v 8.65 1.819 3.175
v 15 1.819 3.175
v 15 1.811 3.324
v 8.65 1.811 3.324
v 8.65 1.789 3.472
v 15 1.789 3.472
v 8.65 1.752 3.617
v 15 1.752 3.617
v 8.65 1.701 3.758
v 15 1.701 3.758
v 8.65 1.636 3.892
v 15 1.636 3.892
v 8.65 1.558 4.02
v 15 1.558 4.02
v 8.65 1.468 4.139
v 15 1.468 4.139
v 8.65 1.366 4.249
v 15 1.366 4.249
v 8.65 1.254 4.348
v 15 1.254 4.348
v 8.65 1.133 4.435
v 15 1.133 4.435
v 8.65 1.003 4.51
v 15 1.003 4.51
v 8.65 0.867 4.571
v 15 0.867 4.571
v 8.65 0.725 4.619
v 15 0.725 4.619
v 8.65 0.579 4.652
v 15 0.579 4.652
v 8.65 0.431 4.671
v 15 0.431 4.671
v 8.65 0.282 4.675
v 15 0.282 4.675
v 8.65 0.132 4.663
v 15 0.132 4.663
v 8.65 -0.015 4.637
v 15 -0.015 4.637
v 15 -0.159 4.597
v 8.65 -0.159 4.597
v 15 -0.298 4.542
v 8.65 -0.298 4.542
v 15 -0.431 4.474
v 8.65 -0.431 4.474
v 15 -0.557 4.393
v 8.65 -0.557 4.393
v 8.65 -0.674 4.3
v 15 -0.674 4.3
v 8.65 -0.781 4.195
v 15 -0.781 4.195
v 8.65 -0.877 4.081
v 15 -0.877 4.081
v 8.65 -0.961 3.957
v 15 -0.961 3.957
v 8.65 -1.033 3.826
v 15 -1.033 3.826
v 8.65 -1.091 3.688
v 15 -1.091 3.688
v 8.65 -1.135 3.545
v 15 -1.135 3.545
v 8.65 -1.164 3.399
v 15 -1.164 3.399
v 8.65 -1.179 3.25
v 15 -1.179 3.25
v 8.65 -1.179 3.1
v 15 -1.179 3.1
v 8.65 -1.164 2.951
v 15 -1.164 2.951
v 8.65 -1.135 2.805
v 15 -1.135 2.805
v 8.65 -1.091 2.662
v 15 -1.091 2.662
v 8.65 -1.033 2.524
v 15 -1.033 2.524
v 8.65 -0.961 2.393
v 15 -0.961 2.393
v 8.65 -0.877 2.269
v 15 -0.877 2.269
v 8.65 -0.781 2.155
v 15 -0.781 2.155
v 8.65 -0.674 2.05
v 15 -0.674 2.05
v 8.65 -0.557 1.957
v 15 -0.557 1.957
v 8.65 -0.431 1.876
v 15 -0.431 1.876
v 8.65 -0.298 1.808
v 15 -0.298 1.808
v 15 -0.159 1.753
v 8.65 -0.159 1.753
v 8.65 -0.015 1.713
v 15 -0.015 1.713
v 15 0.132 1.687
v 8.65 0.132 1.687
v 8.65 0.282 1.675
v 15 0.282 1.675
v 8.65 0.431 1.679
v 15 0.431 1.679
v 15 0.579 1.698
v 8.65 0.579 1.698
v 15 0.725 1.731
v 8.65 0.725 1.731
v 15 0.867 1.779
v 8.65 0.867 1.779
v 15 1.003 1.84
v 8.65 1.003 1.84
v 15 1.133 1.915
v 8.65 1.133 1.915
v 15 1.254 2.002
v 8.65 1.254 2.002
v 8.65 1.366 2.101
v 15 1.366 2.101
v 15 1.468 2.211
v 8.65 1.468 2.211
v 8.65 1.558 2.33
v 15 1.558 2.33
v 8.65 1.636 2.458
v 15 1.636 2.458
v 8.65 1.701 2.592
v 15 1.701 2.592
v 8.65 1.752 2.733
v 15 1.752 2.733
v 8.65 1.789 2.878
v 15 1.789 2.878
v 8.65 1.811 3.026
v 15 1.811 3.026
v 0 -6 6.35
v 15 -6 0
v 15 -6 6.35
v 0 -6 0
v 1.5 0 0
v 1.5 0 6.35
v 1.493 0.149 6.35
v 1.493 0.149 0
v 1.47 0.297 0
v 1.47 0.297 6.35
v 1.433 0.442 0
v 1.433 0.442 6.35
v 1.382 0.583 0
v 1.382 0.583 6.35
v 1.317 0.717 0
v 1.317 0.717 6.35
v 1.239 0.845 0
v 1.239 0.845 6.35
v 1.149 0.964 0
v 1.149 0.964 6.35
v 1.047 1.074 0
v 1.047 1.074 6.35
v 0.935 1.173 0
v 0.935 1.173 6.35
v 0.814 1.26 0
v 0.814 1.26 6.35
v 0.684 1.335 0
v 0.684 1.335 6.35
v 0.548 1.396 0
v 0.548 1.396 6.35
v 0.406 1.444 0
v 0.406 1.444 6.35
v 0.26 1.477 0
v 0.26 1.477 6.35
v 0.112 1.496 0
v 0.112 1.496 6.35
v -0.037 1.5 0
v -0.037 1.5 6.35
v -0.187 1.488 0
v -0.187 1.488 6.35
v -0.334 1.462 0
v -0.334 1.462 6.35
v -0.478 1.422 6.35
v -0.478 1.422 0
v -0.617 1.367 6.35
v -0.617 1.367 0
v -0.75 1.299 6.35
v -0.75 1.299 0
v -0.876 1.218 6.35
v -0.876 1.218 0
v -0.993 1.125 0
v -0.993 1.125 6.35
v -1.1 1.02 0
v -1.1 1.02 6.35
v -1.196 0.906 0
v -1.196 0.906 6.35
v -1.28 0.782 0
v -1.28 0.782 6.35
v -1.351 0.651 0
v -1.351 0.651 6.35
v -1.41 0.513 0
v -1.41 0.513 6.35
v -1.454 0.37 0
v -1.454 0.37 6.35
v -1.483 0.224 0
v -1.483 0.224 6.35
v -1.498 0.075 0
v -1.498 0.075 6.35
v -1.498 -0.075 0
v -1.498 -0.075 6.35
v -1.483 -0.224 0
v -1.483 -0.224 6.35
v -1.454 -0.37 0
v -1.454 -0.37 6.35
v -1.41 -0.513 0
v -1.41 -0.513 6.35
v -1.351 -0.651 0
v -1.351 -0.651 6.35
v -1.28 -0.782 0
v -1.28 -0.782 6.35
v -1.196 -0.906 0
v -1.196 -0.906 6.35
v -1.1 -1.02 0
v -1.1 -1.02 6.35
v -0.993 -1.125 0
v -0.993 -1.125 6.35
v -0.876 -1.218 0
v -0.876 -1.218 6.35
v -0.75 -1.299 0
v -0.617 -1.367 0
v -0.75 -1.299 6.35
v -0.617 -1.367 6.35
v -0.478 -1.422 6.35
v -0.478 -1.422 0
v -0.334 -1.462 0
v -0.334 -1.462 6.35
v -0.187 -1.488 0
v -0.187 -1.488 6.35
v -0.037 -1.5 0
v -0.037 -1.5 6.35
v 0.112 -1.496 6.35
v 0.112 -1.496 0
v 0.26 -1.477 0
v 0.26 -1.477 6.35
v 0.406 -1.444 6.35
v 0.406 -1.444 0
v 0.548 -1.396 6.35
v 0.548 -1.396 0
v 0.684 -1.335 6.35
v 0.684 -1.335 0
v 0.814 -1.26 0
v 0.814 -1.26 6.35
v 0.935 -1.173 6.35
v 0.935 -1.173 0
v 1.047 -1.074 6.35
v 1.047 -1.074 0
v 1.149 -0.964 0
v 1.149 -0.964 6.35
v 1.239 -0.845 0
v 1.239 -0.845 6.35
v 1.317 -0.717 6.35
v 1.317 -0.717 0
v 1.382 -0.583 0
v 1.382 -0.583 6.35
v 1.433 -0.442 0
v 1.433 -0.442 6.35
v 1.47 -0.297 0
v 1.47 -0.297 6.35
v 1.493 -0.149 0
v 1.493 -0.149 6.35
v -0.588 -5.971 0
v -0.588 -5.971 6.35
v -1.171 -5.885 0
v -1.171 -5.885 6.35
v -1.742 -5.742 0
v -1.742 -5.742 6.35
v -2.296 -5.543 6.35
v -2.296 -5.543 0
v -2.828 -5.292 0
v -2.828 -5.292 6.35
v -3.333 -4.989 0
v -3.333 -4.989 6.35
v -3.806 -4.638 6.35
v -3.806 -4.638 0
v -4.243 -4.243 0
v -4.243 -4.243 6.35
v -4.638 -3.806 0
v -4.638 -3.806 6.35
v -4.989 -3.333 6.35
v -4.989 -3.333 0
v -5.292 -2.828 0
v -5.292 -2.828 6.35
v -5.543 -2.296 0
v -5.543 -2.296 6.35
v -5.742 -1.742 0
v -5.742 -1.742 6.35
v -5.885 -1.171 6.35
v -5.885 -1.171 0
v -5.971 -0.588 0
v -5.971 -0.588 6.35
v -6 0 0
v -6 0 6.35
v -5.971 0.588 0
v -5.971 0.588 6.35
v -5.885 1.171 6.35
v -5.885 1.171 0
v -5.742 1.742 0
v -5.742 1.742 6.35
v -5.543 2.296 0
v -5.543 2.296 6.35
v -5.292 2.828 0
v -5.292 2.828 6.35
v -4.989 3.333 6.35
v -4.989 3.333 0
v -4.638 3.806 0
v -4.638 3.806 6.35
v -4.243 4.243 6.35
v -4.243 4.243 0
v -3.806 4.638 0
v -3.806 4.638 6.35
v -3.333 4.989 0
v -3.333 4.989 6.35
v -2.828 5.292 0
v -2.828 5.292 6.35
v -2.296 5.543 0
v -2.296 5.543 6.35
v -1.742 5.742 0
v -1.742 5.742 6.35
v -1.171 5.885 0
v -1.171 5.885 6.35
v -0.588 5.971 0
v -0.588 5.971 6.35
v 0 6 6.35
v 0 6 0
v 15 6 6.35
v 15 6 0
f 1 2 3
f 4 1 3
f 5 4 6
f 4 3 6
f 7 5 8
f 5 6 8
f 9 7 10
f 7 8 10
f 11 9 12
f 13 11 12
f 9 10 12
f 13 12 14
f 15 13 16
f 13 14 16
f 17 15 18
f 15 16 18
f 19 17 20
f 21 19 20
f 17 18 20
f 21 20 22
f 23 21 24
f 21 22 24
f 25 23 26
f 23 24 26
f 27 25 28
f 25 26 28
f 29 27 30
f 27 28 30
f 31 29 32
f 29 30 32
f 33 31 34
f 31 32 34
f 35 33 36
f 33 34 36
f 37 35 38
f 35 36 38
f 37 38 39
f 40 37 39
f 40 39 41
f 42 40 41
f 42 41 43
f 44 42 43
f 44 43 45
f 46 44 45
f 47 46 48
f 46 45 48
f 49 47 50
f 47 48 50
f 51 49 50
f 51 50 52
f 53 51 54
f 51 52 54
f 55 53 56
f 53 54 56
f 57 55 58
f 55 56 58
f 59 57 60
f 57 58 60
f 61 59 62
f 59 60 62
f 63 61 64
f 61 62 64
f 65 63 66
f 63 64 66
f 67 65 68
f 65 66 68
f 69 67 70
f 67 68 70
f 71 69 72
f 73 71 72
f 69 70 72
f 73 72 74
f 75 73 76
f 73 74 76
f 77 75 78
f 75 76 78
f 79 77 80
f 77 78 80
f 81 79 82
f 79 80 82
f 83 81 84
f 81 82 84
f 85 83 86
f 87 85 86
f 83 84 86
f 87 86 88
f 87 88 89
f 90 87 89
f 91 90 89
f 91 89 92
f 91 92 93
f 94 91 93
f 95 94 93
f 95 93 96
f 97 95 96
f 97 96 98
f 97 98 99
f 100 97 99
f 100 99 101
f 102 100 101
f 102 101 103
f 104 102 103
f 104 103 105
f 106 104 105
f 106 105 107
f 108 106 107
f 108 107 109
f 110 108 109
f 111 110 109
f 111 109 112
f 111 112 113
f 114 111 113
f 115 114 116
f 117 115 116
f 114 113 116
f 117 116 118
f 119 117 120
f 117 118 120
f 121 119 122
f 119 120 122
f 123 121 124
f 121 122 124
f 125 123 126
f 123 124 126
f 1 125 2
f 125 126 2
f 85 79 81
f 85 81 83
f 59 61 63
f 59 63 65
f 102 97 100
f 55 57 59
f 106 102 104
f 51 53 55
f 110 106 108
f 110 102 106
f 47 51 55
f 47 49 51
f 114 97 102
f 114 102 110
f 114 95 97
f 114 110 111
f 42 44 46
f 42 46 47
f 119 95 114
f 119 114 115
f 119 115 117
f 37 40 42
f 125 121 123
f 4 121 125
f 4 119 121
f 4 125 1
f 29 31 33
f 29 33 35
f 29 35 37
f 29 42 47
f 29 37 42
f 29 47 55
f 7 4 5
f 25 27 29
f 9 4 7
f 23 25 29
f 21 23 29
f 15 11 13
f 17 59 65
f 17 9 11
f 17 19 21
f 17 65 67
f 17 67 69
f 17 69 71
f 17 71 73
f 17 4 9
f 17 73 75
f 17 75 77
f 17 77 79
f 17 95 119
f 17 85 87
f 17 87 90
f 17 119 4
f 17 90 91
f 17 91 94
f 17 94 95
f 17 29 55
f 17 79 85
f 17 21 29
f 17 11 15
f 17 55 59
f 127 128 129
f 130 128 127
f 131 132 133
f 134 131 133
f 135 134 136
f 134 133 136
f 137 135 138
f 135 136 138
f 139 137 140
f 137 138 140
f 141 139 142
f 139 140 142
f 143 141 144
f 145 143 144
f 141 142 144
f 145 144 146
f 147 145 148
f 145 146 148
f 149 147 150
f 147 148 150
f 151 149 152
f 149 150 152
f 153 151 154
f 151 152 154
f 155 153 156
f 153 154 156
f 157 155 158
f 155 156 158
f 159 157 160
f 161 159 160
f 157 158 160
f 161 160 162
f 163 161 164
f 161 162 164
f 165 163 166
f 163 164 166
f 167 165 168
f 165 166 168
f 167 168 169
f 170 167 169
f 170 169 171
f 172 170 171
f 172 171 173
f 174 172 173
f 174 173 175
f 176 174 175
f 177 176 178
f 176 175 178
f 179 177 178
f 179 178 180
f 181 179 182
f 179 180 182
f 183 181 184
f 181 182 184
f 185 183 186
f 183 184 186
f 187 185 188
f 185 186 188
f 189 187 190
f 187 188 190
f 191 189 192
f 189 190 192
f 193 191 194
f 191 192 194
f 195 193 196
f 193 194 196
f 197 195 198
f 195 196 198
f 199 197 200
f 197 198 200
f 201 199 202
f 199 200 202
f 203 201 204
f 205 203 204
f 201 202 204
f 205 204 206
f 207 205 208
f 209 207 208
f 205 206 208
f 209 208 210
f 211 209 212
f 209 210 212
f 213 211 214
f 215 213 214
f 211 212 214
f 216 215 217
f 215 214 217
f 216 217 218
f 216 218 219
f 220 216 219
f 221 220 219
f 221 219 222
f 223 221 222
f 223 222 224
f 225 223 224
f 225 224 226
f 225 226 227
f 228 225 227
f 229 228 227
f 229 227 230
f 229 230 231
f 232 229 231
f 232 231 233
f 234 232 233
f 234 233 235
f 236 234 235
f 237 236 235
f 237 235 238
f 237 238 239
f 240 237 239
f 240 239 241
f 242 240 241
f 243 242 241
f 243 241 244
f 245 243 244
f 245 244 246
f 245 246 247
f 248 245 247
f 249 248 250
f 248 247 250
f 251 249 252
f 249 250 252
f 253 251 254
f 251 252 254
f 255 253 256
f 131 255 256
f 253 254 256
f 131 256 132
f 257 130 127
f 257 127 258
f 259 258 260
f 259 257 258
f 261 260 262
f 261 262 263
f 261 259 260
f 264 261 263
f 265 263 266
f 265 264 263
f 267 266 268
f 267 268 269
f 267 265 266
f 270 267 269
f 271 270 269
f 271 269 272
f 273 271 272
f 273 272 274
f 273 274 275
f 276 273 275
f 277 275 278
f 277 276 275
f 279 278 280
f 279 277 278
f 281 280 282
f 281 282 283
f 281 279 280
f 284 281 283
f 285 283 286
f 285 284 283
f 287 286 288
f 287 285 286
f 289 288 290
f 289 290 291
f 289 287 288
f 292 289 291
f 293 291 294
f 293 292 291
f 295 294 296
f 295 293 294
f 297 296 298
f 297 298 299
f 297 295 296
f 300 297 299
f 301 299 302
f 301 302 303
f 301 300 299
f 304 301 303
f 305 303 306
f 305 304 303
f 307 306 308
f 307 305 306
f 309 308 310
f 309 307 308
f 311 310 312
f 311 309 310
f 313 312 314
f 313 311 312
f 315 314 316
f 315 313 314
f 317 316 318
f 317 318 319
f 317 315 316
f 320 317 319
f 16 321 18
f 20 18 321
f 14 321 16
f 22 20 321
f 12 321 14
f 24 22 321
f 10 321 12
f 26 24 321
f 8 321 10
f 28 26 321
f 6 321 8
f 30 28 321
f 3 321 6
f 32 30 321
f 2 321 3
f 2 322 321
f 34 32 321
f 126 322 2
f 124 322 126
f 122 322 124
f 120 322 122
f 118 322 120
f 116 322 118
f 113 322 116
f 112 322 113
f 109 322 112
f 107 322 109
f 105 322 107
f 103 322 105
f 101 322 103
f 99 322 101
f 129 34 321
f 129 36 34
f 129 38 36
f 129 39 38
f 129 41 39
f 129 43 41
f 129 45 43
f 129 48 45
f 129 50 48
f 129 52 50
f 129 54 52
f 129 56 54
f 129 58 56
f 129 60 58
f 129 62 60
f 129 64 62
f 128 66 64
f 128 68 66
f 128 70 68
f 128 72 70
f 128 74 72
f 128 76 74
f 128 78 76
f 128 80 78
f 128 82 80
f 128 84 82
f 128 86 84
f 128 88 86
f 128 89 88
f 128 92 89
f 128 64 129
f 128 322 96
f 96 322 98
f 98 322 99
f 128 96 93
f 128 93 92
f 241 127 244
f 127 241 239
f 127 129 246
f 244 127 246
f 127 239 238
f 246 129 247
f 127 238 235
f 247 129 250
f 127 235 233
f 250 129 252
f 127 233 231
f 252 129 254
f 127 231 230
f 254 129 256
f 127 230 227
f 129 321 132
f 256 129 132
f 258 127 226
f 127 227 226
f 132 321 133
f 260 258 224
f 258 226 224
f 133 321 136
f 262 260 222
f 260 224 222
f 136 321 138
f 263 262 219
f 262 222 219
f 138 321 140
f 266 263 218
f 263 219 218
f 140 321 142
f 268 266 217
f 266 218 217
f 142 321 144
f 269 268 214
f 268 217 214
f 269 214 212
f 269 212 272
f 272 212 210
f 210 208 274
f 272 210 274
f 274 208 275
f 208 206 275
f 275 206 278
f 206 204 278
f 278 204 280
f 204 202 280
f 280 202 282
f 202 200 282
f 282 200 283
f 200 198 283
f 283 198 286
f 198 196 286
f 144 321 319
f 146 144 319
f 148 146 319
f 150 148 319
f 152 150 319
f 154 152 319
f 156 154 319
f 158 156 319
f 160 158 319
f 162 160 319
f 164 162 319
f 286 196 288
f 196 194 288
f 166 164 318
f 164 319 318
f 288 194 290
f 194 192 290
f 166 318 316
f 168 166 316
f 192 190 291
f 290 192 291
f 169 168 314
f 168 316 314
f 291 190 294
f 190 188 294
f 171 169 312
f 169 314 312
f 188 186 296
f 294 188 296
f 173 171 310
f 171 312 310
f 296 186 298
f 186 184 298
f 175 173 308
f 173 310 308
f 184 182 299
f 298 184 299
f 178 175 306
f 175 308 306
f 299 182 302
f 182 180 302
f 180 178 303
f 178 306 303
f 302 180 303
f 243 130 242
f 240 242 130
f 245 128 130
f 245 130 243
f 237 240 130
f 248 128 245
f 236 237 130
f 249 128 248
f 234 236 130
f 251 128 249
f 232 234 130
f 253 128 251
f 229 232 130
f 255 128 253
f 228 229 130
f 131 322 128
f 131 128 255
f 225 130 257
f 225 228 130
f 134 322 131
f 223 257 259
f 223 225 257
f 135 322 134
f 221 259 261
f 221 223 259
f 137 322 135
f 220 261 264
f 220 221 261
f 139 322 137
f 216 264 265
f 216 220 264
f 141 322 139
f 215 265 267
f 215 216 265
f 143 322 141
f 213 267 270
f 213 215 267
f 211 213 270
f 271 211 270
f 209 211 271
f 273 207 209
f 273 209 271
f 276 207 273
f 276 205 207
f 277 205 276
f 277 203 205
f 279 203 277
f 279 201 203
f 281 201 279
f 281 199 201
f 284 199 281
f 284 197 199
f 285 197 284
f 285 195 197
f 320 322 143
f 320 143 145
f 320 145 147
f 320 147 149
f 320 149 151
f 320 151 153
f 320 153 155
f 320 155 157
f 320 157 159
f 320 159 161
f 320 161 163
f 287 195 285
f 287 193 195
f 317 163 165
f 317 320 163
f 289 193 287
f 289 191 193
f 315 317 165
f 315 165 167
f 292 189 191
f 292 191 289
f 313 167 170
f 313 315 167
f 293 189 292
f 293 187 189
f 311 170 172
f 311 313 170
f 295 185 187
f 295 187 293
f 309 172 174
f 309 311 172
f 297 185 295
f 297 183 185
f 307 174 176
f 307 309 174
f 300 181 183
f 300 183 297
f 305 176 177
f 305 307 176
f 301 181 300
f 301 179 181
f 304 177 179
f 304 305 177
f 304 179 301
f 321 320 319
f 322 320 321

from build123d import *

# Parameters (mm, degrees)
BOSS_EXTRU_1_DEPTH      = 6.35
ESQUISSE3_R             = 1.5
ENL_V_MAT_EXTRU_1_DEPTH = 6.35
ESQUISSE4_R             = 1.5
ENL_V_MAT_EXTRU_2_DEPTH = 6.35


with BuildPart() as part:
    # Esquisse2 → Boss.-Extru.1 (new body)
    with BuildSketch(Plane.XY):
        with BuildLine():
            Line((0, 6), (15, 6))
            Line((15, 6), (15, -6))
            Line((15, -6), (0, -6))
            ThreePointArc((0, -6), (-6, 0), (0, 6))
        make_face()
    extrude(amount=BOSS_EXTRU_1_DEPTH)

    # Esquisse3 → Enlèv. mat.-Extru.1 (cut)
    with BuildSketch(Plane(origin=(15, 0, 0), x_dir=(0, 0, -1), z_dir=(1, 0, 0))):
        with Locations(Location((-3.175, 0.318926735, 0), (0, 0, 90))):
            Circle(ESQUISSE3_R)
    extrude(amount=-ENL_V_MAT_EXTRU_1_DEPTH, mode=Mode.SUBTRACT)

    # Esquisse4 → Enlèv. mat.-Extru.2 (cut)
    with BuildSketch(Plane.XY.offset(6.35)):
        Circle(ESQUISSE4_R)
    extrude(amount=-ENL_V_MAT_EXTRU_2_DEPTH, mode=Mode.SUBTRACT)


solid = part.part
